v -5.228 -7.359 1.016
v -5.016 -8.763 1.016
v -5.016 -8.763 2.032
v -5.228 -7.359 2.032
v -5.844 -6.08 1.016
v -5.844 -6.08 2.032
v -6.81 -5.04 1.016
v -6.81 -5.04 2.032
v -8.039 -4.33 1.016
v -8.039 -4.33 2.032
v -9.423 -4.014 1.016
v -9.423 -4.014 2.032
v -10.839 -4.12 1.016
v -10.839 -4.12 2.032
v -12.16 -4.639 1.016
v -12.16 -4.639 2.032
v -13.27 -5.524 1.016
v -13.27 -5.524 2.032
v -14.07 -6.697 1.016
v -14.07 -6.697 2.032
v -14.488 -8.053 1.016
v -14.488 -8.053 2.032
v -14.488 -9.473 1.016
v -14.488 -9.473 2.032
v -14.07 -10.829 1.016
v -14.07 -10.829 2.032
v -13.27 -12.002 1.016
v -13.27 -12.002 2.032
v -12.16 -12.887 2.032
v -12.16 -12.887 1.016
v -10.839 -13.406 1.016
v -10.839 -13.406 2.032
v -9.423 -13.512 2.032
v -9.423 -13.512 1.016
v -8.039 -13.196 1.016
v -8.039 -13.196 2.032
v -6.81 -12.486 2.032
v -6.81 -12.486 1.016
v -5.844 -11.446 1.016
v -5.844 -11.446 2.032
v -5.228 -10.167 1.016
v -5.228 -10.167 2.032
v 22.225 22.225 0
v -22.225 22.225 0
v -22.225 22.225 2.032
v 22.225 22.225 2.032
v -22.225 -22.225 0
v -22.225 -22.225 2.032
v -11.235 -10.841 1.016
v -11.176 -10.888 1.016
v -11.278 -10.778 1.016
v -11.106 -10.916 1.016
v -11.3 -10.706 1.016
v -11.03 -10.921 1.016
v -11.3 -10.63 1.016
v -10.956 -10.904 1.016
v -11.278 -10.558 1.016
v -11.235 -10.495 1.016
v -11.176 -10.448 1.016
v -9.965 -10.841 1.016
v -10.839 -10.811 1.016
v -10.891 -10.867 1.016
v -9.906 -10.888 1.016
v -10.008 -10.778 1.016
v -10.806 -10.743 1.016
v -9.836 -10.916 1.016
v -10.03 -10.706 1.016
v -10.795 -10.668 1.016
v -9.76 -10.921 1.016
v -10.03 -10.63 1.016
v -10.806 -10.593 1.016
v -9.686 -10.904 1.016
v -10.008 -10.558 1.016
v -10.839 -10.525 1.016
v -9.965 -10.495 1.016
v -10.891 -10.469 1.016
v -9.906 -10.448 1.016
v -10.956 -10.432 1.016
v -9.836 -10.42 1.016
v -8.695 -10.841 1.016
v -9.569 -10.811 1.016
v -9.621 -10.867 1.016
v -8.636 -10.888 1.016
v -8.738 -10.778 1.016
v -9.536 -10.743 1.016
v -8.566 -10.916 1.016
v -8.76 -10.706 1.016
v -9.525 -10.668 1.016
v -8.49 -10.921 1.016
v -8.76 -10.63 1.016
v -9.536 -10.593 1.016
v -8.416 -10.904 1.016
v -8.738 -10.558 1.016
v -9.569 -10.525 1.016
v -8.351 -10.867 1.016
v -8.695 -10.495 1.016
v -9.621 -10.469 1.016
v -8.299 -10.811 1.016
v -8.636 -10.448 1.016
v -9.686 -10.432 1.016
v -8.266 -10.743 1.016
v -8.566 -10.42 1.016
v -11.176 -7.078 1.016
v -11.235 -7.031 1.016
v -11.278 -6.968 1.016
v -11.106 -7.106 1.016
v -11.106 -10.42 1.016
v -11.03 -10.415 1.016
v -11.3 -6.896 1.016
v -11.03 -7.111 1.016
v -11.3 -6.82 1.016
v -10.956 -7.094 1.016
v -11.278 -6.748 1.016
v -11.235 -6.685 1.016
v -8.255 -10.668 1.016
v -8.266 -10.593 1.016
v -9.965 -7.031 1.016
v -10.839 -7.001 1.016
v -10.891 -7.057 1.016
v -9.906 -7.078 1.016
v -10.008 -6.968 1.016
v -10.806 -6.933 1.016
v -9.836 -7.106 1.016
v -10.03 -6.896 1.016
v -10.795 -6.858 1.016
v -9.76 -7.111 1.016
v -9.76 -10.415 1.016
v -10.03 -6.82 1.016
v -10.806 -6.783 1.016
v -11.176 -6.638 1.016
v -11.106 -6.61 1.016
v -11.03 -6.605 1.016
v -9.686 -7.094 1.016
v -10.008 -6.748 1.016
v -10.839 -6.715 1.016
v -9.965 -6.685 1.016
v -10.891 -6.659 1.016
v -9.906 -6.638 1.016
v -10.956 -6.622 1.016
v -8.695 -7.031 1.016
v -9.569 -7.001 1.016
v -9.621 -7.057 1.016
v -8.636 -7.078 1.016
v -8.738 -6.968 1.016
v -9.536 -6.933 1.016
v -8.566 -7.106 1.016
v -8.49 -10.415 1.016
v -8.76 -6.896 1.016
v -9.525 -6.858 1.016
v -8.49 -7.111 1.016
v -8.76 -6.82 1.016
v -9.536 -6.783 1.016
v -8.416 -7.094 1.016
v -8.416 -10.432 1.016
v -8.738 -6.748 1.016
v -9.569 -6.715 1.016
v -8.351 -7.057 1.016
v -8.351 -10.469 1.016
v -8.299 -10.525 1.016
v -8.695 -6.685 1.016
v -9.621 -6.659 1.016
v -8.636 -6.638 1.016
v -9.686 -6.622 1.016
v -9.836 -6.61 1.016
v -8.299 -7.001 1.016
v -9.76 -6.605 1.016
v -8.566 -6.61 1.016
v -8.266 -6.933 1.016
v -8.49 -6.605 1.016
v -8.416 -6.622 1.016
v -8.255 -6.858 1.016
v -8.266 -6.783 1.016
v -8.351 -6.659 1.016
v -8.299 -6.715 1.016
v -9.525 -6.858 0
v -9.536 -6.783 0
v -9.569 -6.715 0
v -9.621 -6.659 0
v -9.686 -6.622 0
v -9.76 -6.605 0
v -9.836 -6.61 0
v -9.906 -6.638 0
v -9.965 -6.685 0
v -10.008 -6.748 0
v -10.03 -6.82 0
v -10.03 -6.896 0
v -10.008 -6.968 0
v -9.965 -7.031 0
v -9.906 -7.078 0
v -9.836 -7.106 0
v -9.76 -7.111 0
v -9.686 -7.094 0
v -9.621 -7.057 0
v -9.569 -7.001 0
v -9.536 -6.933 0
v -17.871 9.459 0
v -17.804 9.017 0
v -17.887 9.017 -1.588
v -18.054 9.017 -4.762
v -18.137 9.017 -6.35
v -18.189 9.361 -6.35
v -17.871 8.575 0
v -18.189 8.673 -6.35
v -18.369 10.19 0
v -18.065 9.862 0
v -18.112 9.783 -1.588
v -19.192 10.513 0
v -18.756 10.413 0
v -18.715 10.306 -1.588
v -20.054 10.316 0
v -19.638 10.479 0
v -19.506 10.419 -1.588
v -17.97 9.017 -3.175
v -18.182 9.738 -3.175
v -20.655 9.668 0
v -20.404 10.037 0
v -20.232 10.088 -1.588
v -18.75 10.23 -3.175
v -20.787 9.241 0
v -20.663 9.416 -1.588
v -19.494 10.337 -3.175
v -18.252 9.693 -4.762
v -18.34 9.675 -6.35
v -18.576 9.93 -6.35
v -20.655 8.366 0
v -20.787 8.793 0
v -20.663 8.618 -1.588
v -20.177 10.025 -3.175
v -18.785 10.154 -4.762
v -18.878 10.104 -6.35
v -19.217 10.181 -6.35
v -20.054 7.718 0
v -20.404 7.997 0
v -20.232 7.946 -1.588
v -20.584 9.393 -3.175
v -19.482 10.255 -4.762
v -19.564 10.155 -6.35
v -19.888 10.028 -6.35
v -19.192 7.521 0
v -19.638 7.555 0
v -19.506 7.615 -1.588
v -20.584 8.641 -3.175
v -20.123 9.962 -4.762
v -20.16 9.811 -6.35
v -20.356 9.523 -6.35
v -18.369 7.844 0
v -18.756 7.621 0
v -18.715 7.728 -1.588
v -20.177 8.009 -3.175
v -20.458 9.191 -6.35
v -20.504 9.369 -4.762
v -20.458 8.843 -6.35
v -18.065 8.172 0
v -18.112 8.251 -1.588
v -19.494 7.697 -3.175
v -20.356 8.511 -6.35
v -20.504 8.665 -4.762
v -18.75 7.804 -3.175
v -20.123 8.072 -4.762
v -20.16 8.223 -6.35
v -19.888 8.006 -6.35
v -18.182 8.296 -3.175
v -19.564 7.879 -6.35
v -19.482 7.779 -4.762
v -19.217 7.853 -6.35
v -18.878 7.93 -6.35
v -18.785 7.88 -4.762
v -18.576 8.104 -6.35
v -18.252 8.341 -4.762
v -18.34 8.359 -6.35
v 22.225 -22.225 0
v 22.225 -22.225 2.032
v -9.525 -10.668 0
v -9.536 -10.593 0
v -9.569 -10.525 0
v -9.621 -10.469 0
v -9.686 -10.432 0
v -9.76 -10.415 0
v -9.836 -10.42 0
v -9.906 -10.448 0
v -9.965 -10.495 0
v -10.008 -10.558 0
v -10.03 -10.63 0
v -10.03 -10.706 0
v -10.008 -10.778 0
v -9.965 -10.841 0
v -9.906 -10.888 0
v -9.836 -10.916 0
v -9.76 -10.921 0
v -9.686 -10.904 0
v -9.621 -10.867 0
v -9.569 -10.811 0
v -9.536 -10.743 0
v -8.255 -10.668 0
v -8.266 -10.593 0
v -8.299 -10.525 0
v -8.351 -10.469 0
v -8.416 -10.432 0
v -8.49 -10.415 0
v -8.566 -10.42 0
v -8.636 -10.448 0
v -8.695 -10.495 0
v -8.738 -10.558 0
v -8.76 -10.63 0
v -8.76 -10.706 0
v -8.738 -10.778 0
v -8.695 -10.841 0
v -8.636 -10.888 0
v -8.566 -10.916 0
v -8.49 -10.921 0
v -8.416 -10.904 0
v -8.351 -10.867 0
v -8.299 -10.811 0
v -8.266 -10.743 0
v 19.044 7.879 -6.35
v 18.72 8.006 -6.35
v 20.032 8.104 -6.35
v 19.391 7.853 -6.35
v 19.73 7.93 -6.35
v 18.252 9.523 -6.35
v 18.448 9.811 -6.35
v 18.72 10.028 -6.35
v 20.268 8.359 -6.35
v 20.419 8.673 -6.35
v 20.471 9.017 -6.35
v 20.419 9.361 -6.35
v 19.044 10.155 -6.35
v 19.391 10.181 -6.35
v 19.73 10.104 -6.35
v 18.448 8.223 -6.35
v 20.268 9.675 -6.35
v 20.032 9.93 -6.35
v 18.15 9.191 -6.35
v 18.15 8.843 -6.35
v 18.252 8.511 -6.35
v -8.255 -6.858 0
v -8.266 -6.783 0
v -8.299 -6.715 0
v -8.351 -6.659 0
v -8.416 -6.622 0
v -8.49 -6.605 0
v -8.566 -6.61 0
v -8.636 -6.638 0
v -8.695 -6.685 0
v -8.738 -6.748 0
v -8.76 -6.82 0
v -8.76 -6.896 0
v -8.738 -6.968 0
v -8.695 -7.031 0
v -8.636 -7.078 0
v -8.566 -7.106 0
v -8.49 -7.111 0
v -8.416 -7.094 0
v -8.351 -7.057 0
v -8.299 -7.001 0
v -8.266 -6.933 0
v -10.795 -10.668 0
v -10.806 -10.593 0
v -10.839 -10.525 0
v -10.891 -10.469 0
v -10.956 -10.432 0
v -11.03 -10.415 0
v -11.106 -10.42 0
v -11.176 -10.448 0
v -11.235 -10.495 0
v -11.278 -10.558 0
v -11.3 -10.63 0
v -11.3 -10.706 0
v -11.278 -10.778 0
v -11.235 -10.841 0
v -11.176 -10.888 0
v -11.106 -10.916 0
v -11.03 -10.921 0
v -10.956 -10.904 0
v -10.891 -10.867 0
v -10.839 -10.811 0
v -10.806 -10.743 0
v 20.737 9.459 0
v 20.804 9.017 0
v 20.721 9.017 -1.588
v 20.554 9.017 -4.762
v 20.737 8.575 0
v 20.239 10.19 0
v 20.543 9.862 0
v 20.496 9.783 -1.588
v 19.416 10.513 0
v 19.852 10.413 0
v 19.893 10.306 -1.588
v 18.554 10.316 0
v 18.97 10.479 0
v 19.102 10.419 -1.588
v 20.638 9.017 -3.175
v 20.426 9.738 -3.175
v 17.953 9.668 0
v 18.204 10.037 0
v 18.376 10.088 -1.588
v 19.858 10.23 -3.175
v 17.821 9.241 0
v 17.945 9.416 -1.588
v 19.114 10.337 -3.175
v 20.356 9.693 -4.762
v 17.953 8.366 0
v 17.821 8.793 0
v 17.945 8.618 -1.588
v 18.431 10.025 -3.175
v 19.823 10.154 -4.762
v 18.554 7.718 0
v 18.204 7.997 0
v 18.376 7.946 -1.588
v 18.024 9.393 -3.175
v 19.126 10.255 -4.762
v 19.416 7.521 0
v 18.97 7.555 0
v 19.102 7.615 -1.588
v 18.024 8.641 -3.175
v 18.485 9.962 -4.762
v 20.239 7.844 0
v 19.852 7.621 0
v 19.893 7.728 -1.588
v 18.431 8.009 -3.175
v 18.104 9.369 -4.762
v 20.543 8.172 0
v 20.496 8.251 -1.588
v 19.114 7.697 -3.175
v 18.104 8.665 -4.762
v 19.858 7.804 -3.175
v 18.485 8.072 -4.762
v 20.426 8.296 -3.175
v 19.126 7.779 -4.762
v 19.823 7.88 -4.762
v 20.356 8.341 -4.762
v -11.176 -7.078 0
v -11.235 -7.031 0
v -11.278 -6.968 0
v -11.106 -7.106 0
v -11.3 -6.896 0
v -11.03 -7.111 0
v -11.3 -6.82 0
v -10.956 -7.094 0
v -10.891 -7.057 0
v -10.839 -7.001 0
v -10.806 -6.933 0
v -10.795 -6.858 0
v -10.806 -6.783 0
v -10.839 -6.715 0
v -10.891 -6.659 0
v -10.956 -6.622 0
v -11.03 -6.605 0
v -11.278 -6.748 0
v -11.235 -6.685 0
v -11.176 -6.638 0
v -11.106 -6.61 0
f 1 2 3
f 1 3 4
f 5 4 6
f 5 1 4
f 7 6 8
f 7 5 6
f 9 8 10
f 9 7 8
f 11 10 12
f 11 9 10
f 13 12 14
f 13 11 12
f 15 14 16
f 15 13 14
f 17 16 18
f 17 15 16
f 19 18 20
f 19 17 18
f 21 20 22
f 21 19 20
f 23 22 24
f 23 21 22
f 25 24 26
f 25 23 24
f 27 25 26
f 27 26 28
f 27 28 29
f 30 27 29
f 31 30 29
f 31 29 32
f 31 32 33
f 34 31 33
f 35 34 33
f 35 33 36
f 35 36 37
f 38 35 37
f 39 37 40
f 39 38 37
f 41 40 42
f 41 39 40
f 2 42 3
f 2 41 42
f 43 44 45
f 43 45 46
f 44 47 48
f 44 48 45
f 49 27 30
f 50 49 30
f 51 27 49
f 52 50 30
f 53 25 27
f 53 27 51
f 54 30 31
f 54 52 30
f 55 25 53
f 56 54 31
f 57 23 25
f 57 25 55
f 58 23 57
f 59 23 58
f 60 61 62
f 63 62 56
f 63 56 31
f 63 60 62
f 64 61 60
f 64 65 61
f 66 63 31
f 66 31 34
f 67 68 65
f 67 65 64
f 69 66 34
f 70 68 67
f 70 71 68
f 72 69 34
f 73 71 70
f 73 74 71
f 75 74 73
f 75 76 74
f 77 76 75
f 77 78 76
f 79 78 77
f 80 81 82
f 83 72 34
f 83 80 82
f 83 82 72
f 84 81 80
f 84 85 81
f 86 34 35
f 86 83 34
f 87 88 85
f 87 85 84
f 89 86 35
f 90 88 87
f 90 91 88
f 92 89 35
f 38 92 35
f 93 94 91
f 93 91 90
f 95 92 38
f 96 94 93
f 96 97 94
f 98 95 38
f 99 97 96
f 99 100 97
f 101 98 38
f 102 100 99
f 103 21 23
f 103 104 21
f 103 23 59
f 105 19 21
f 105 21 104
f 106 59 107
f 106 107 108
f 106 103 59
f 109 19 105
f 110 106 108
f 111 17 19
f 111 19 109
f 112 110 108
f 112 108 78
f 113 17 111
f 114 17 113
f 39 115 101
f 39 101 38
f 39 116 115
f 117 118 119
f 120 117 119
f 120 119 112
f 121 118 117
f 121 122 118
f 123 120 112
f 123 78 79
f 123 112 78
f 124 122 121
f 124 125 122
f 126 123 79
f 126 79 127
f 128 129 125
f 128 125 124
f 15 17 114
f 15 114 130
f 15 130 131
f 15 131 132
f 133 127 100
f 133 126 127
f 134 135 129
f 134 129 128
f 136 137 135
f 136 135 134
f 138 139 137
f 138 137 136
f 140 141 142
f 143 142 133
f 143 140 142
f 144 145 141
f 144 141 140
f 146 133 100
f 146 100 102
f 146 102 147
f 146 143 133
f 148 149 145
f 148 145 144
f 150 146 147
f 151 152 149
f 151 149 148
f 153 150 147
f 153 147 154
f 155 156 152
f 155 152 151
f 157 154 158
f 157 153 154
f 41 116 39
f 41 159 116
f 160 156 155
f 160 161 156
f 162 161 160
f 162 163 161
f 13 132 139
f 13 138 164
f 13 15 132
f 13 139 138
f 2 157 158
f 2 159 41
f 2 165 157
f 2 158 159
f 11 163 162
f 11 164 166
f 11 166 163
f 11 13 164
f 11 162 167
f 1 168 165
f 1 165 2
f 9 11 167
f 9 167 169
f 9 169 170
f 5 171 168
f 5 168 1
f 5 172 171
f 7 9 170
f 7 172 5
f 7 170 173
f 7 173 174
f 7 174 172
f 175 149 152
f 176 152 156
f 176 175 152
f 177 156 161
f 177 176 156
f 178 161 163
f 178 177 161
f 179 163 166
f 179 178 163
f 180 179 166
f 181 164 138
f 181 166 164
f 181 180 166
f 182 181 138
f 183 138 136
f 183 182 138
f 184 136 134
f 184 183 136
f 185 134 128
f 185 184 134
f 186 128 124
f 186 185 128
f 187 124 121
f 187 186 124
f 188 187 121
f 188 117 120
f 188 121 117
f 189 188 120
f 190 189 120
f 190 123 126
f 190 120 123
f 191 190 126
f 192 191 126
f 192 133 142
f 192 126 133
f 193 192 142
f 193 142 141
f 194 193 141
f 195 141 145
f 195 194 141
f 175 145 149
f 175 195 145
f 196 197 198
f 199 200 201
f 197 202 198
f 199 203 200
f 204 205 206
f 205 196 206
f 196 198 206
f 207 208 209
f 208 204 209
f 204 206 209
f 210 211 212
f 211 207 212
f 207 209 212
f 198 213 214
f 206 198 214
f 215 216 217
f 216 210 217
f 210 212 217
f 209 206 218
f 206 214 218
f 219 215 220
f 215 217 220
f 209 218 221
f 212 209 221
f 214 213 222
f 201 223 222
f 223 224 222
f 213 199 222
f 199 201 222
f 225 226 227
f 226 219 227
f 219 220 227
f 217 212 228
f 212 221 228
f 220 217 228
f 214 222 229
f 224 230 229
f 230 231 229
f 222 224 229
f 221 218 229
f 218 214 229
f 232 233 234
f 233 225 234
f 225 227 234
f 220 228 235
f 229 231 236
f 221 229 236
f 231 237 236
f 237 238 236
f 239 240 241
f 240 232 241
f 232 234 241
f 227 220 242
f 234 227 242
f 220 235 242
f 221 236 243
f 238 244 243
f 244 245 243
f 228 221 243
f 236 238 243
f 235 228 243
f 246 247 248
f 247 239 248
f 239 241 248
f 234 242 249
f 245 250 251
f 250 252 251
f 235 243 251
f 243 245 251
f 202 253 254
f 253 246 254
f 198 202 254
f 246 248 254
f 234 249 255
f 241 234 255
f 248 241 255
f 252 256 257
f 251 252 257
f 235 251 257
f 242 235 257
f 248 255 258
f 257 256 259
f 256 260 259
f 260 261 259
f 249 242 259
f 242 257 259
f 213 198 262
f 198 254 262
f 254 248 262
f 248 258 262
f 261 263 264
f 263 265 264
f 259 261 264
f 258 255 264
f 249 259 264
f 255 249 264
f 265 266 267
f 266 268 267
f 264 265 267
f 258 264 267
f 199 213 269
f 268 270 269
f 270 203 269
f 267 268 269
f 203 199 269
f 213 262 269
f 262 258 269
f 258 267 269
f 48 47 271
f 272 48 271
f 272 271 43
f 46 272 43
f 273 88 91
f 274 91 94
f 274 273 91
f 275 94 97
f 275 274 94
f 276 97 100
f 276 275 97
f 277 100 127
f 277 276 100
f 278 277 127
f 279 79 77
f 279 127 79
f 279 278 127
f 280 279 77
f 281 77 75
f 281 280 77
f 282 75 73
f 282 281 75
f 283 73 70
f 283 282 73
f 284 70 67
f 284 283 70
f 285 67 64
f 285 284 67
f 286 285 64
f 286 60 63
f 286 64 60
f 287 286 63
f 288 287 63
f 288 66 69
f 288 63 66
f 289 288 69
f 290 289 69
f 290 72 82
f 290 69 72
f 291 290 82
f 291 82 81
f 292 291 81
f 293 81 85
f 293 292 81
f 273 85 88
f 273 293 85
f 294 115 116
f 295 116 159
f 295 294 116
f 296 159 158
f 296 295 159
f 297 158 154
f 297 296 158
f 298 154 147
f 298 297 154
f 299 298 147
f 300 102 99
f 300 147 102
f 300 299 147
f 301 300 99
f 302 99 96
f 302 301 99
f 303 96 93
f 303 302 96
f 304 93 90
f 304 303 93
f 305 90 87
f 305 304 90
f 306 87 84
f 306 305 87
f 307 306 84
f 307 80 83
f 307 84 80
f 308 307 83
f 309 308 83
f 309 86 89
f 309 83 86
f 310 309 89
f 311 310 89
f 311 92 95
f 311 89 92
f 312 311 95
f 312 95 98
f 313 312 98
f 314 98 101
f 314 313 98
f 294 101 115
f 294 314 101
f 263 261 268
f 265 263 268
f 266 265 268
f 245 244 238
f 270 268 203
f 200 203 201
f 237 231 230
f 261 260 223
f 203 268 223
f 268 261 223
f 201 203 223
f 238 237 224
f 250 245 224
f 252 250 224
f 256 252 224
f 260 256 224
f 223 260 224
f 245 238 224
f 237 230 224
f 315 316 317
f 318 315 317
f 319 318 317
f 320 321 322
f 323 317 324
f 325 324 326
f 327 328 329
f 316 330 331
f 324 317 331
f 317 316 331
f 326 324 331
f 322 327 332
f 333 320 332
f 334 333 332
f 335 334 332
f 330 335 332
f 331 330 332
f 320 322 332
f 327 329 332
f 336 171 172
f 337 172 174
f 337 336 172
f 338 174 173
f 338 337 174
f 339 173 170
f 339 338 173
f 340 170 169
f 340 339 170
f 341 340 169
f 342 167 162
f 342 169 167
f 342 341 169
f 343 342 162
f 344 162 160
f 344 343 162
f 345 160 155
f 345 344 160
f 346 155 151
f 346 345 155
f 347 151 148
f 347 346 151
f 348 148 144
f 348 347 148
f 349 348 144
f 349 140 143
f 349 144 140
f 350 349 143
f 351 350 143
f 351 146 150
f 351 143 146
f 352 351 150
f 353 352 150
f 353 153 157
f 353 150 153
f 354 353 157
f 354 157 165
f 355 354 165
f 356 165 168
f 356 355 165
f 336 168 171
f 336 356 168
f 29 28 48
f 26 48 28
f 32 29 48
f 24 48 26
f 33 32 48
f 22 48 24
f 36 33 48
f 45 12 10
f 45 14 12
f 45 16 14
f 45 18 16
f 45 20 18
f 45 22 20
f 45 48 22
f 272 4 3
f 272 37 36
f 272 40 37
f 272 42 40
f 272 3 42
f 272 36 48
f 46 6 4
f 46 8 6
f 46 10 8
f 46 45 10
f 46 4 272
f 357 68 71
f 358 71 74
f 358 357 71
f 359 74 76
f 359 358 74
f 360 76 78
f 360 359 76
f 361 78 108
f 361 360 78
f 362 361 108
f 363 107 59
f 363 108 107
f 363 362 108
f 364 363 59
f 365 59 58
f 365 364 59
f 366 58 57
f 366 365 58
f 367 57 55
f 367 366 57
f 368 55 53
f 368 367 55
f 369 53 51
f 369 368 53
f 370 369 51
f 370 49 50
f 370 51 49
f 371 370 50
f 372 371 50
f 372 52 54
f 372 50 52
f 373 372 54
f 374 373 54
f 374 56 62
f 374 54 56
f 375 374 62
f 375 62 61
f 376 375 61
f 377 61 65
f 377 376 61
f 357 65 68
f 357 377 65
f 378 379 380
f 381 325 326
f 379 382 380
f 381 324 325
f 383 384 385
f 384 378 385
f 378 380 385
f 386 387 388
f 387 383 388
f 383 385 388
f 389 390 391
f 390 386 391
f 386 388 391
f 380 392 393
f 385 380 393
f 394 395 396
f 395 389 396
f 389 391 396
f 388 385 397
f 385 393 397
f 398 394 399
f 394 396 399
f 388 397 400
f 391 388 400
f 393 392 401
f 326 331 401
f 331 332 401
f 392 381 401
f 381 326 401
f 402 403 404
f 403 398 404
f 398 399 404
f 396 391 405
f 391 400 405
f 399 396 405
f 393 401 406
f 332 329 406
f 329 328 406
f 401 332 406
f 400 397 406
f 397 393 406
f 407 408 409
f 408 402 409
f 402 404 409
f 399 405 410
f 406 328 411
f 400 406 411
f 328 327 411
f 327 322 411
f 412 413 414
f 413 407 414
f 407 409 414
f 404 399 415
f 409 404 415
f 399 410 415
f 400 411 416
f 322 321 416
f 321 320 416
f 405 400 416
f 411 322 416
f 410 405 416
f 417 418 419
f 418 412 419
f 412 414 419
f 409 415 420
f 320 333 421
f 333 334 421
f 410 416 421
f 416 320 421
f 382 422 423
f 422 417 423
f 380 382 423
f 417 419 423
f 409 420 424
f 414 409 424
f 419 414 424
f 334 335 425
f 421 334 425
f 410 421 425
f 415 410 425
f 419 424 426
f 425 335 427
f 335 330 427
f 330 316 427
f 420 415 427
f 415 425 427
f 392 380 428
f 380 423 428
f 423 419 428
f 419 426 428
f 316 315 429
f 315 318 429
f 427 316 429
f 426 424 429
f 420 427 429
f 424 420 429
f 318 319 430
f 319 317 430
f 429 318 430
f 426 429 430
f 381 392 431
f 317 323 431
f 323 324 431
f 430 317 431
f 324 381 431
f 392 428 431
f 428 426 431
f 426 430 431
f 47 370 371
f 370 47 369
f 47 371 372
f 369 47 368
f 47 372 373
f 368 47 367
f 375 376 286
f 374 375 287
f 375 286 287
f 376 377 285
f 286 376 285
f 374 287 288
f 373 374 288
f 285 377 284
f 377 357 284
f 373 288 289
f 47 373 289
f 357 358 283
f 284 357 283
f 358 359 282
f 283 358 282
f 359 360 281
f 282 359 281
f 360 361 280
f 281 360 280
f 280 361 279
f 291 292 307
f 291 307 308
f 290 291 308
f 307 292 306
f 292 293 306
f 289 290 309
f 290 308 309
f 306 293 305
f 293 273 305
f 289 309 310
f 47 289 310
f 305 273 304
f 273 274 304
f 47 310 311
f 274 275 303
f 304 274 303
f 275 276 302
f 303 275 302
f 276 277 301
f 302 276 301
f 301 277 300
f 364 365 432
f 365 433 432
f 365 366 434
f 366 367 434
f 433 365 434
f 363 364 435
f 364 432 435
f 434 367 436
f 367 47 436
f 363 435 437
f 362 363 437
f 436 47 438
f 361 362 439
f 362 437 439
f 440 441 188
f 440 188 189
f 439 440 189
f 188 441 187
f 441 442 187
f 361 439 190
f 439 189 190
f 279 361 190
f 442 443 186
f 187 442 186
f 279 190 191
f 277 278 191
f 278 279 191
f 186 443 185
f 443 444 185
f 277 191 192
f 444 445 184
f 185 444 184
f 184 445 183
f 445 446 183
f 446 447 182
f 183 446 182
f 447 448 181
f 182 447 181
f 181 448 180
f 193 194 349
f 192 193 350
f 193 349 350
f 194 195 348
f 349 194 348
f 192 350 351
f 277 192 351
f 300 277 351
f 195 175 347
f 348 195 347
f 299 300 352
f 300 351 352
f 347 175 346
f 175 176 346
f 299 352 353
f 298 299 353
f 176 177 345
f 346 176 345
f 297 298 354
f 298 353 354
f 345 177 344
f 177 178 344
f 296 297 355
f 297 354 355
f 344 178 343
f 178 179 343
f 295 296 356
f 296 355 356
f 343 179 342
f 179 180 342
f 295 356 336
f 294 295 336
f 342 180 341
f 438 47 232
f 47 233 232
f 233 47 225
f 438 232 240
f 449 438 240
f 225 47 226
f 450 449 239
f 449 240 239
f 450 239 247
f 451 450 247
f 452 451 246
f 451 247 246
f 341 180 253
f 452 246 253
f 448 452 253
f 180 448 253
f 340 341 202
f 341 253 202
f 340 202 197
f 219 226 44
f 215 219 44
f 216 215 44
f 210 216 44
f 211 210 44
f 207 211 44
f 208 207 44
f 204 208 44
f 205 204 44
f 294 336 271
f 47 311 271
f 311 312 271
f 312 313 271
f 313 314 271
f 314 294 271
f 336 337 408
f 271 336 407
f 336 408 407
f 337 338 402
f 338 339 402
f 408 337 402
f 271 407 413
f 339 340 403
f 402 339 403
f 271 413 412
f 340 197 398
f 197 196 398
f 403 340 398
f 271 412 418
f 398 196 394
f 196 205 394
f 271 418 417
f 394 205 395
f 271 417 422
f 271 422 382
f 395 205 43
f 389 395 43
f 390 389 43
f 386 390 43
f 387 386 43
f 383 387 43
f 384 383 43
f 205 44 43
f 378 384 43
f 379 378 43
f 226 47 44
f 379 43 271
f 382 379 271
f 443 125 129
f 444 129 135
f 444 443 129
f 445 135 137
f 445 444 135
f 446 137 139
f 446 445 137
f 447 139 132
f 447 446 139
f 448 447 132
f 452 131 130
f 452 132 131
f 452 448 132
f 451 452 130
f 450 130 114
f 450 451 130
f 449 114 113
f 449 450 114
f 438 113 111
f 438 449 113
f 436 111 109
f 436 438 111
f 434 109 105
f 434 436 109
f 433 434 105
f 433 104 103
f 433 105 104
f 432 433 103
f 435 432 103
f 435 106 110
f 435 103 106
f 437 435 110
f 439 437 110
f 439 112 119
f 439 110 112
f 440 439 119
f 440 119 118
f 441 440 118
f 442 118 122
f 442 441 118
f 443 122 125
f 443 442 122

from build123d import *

# Parameters (mm, degrees)
F0_W     = 44.45
F0_H     = 44.45
F1_DEPTH = 2.032
F2_R     = 1.5
F3_DEPTH = 6.35
F3_TAPER = 3
F4_R     = 0.254
F5_DEPTH = 25.4
F7_START = 1.016
F6_R     = 4.7625
F7_DEPTH = 1.016


with BuildPart() as f1:
    # F0 (on Top) → F1 (new body)
    with BuildSketch(Plane.XY):
        Rectangle(F0_W, F0_H)
    extrude(amount=F1_DEPTH)

    # F2 (on Top) → F3 (join)
    with BuildSketch(Plane.XY):
        with Locations((-19.304, 9.017)):
            Circle(F2_R)
        with Locations((19.304, 9.017)):
            Circle(F2_R)
    extrude(amount=-F3_DEPTH, taper=F3_TAPER)

    # F4 (on Top) → F5 (cut)
    with BuildSketch(Plane.XY):
        with Locations((-11.049, -6.858)):
            Circle(F4_R)
        with Locations((-11.049, -10.668)):
            Circle(F4_R)
        with Locations((-9.779, -6.858)):
            Circle(F4_R)
        with Locations((-9.779, -10.668)):
            Circle(F4_R)
        with Locations((-8.509, -6.858)):
            Circle(F4_R)
        with Locations((-8.509, -10.668)):
            Circle(F4_R)
    extrude(amount=F5_DEPTH, mode=Mode.SUBTRACT)

    # F6 (on Top) → F7 (cut)
    with BuildSketch(Plane.XY.offset(F7_START)):
        with Locations((-9.779, -8.763)):
            Circle(F6_R)
    extrude(amount=F7_DEPTH, mode=Mode.SUBTRACT)


solid = f1.part
